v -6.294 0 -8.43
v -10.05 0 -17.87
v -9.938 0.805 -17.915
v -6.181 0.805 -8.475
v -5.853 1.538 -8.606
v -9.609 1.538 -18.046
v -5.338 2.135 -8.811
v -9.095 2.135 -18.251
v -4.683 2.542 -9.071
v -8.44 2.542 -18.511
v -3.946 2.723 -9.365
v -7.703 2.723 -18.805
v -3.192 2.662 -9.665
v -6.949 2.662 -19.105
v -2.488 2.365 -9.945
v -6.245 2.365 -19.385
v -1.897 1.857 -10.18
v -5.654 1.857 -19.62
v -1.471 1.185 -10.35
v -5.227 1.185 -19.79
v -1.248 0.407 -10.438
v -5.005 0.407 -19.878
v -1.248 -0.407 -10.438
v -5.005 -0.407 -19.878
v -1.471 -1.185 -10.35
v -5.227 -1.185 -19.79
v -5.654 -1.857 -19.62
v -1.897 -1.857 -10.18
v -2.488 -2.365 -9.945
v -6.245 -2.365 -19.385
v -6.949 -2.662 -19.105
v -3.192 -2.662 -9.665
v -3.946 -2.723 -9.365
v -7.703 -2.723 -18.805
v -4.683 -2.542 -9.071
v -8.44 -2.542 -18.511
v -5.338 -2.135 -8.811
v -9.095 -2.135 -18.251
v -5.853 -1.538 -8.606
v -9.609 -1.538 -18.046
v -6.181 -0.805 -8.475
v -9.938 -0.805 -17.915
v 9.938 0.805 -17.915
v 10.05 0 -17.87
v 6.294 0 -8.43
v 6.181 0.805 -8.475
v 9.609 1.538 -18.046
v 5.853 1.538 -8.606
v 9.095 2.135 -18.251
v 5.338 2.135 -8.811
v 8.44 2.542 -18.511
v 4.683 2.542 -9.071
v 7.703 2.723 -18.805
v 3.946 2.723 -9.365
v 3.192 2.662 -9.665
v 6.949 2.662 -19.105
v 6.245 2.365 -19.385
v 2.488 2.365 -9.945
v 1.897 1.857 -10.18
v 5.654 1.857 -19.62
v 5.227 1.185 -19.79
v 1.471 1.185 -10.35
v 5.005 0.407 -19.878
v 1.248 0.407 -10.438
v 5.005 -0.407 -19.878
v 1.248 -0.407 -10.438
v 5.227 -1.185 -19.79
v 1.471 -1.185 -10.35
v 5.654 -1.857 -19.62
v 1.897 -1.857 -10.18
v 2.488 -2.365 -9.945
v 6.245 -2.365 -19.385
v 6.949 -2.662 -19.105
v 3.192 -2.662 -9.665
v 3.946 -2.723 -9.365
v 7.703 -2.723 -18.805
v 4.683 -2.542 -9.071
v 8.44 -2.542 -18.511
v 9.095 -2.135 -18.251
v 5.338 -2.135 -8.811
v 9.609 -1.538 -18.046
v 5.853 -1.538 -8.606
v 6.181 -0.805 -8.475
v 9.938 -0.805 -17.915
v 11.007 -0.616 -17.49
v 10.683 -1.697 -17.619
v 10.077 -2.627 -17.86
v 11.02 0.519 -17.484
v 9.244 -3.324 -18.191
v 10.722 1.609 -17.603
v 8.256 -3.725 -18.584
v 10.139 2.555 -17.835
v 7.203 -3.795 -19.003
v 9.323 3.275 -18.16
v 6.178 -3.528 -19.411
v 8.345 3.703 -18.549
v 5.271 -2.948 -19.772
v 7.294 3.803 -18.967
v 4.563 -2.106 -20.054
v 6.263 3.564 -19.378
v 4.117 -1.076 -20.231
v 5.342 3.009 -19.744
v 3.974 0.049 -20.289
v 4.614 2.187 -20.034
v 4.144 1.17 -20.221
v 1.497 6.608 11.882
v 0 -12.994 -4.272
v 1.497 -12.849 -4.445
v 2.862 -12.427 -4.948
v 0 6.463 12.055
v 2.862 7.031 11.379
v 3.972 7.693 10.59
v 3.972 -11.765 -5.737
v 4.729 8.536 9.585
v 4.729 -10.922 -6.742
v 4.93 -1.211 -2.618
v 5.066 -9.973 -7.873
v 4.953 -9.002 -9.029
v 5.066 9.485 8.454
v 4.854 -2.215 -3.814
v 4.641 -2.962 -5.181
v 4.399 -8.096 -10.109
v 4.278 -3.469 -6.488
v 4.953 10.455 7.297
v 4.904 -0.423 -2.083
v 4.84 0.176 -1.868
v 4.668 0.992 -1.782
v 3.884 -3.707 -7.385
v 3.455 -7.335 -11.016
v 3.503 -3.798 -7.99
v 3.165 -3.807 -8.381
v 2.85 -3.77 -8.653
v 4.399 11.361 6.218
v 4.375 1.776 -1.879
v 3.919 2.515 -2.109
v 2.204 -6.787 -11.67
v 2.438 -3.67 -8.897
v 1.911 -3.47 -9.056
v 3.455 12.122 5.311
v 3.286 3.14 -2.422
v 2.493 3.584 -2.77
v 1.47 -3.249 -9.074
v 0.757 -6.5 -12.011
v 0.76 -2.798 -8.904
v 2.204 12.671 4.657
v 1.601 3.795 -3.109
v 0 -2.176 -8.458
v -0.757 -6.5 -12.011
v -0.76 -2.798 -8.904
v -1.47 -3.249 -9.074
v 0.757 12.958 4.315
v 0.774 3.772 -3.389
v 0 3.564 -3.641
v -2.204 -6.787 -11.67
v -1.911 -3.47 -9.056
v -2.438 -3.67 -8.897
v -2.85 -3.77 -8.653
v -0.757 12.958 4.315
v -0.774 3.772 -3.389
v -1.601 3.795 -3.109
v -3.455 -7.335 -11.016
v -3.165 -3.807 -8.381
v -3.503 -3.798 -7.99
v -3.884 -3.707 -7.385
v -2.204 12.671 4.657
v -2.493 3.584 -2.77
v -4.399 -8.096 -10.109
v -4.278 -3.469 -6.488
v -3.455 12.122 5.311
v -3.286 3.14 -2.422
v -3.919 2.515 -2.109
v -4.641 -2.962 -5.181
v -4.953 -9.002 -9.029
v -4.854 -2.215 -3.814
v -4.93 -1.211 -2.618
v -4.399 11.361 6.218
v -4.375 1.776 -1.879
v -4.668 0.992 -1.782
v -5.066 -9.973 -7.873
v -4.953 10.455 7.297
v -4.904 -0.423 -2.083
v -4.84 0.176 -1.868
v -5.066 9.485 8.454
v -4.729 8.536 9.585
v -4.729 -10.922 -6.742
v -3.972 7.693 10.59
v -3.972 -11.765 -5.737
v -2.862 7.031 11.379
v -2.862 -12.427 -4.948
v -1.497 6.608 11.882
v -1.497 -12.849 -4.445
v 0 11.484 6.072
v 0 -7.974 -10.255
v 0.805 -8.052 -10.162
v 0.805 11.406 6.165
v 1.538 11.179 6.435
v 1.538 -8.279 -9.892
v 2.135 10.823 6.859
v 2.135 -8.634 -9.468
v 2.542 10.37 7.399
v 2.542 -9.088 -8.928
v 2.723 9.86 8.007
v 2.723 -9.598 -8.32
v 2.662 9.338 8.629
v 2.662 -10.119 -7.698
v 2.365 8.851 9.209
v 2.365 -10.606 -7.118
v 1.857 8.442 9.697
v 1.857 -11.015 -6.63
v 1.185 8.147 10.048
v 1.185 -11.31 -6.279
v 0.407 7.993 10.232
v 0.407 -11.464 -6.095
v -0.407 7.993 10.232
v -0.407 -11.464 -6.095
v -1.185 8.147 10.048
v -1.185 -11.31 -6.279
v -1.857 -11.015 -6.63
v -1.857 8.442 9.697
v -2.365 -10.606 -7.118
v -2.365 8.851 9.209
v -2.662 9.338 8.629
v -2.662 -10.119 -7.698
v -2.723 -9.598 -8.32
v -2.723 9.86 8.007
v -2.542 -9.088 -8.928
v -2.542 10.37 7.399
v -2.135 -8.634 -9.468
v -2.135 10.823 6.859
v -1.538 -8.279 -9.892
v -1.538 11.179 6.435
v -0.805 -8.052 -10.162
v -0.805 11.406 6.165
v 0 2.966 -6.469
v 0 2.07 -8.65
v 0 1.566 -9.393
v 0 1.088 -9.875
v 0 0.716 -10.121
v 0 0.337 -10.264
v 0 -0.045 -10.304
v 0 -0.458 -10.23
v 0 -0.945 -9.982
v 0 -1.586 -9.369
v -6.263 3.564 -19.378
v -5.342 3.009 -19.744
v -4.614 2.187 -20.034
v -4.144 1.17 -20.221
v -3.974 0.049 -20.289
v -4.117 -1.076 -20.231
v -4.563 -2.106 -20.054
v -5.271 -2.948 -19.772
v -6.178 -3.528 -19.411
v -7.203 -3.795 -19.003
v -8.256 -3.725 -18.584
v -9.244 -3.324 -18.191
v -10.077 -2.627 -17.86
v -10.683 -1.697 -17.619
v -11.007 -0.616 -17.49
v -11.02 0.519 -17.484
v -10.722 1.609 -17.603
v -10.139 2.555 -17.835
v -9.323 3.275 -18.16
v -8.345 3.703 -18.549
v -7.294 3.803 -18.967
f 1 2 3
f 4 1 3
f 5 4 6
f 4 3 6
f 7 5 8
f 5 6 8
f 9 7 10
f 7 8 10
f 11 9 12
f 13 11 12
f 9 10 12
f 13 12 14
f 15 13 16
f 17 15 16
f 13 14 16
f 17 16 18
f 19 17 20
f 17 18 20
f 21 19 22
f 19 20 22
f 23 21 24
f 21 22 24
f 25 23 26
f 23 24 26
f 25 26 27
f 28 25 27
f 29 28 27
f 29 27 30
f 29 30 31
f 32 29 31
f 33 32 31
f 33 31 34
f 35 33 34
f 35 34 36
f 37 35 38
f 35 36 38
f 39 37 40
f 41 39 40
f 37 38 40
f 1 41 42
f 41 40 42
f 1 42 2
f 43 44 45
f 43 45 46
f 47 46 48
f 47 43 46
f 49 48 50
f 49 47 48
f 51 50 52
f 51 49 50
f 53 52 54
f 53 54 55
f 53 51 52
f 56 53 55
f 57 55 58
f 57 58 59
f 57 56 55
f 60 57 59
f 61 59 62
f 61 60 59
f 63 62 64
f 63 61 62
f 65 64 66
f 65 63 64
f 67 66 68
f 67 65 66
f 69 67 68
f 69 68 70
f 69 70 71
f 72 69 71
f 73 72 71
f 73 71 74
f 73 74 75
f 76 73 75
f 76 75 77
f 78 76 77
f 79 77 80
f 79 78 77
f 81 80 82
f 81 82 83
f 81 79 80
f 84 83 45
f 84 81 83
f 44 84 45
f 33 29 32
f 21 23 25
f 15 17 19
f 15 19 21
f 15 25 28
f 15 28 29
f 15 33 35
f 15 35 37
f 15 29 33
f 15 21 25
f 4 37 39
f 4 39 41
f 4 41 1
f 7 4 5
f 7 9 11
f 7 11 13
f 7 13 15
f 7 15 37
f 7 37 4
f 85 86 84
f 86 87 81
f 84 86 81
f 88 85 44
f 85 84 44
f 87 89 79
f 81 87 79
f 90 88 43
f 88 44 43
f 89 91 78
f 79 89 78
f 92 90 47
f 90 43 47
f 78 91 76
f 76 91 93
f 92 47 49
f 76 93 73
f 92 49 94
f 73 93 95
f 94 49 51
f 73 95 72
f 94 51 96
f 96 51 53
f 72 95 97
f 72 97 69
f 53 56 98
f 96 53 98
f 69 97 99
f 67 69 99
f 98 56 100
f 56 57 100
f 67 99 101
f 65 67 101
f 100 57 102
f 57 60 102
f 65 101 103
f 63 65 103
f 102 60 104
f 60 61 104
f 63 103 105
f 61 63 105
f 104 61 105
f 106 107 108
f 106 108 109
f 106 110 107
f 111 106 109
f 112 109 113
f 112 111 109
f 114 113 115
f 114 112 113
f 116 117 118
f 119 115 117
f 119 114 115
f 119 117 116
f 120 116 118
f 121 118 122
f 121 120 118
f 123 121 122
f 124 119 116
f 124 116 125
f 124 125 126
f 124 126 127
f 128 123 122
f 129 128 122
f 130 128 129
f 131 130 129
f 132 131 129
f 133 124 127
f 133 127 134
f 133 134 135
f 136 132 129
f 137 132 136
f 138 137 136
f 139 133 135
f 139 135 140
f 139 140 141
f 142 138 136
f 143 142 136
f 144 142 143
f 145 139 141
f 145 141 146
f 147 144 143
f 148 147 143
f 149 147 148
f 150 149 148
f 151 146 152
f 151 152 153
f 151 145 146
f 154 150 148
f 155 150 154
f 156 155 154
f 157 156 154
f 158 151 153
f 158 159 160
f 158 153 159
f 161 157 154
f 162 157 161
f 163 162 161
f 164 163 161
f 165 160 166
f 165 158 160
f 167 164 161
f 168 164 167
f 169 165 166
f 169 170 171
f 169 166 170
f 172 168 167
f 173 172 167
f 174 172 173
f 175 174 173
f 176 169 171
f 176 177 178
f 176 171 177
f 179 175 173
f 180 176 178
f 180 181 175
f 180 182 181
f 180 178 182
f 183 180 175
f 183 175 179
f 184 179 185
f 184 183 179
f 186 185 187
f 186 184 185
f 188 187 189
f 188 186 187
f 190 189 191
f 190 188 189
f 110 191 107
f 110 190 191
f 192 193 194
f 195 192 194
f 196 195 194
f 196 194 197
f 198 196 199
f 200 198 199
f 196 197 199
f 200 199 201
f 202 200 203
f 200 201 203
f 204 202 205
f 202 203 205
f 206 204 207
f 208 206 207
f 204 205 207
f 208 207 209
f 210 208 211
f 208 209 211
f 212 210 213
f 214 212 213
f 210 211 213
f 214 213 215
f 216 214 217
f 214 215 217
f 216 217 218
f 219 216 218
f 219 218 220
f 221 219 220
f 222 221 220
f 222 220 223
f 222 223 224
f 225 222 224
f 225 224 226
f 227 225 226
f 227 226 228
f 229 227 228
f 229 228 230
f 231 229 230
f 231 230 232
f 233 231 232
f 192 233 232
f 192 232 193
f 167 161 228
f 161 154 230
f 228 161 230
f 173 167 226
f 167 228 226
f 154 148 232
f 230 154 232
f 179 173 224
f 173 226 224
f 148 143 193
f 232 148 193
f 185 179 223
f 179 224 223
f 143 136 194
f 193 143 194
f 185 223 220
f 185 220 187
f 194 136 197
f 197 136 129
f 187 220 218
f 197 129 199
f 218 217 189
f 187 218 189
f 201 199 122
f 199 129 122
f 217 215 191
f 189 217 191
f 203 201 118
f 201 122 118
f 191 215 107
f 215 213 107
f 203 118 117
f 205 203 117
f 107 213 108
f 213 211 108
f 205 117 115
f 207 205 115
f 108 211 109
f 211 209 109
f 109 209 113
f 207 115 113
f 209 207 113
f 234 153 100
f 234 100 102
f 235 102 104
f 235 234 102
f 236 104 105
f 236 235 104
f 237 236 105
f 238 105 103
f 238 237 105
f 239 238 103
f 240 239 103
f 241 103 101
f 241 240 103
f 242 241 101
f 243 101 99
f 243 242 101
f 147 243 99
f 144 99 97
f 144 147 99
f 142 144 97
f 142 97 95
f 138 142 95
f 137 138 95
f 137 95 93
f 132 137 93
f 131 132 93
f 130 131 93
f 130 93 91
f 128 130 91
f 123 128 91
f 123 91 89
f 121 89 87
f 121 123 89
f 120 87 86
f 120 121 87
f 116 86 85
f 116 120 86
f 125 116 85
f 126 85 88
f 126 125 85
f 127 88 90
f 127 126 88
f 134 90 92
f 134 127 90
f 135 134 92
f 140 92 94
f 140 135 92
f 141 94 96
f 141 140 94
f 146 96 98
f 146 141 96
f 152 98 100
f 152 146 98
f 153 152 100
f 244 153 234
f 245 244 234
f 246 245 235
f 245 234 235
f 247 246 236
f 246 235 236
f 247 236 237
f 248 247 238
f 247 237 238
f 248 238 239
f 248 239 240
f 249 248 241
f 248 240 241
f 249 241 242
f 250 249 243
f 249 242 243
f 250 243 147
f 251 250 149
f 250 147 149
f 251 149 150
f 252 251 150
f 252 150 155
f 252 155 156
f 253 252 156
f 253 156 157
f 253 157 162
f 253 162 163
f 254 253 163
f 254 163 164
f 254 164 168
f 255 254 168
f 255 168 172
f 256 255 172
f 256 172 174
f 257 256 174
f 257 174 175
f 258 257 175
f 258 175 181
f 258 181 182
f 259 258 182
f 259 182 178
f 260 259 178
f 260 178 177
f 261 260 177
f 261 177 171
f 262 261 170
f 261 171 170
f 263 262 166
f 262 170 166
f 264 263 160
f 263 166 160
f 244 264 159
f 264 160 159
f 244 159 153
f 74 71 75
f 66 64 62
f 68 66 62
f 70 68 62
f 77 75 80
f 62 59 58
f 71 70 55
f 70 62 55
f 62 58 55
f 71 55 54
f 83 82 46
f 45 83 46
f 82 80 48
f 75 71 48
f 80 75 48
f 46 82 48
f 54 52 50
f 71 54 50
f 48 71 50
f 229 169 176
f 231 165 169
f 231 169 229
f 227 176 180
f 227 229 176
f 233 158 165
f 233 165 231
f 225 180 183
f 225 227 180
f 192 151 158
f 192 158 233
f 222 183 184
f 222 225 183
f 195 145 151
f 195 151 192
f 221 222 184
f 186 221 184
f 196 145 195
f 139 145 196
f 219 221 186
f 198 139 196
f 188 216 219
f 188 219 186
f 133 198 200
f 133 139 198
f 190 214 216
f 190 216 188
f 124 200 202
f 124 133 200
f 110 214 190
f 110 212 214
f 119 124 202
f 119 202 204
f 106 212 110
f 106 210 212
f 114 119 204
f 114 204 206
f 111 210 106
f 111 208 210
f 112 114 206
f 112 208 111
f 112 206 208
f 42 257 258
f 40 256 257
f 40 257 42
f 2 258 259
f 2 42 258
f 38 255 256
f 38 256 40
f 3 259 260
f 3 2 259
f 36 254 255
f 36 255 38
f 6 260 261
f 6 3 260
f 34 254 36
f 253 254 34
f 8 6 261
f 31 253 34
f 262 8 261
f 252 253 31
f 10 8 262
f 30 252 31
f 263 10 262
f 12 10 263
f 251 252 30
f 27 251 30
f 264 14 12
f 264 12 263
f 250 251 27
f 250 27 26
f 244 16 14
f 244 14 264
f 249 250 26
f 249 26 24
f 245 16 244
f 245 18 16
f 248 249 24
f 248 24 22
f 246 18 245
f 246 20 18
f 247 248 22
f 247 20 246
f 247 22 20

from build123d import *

# Parameters (mm, degrees)
SKETCH1_R           = 5.08
BOSS_EXTRUDE1_DEPTH = 12.7
SKETCH5_R           = 3.81
BOSS_EXTRUDE2_DEPTH = 20.32
SKETCH6_R           = 2.7305
CUT_EXTRUDE1_DEPTH  = 10.16
CUT_EXTRUDE2_REACH  = 34.362
SKETCH7_R           = 2.7305


with BuildPart() as part:
    # Sketch1 → Boss-Extrude1 (new, symmetric)
    with BuildSketch(Plane(origin=(0, 0, 0), x_dir=(1, 0, 0), z_dir=(0, 0.7660444431189771, 0.6427876096865406))):
        Circle(SKETCH1_R)
    extrude(amount=BOSS_EXTRUDE1_DEPTH, both=True)

    # Sketch5 → Boss-Extrude2 (add)
    with BuildSketch(Plane(origin=(0, 0, 0), x_dir=(0, -1, 0), z_dir=(-0.36974675727382683, 0, -0.9291325715340572))):
        Circle(SKETCH5_R)
    boss_extrude2 = extrude(amount=BOSS_EXTRUDE2_DEPTH)

    # Sketch6 → Cut-Extrude1 (cut)
    with BuildSketch(Plane(origin=(-7.513254108, 0, -18.879973854), x_dir=(-0.9291325715340572, 0, 0.36974675727382694), z_dir=(-0.3697467572738269, 0, -0.929132571534057))):
        Circle(SKETCH6_R)
    cut_extrude1 = extrude(amount=-CUT_EXTRUDE1_DEPTH, mode=Mode.SUBTRACT)

    # Mirror1: Boss-Extrude2, Cut-Extrude1 across plane
    add(boss_extrude2.mirror(Plane(origin=(0, 0, 0), x_dir=(0, 0, 1), z_dir=(1, 0, 0))))
    add(cut_extrude1.mirror(Plane(origin=(0, 0, 0), x_dir=(0, 0, 1), z_dir=(1, 0, 0))), mode=Mode.SUBTRACT)

    # Sketch7 → Cut-Extrude2 (cut, up to next)
    with BuildSketch(Plane(origin=(0, -9.728764428, -8.163402643), x_dir=(1, 0, 0), z_dir=(0, -0.7660444431189772, -0.6427876096865405)), mode=Mode.PRIVATE) as cut_extrude2_sk1:
        Circle(SKETCH7_R)
    cut_extrude2_tool1 = extrude(cut_extrude2_sk1.sketch, amount=-CUT_EXTRUDE2_REACH, mode=Mode.PRIVATE) & part.part
    add(cut_extrude2_tool1.solids().sort_by_distance((0, -9.728764, -8.163403))[0], mode=Mode.SUBTRACT)


solid = part.part
